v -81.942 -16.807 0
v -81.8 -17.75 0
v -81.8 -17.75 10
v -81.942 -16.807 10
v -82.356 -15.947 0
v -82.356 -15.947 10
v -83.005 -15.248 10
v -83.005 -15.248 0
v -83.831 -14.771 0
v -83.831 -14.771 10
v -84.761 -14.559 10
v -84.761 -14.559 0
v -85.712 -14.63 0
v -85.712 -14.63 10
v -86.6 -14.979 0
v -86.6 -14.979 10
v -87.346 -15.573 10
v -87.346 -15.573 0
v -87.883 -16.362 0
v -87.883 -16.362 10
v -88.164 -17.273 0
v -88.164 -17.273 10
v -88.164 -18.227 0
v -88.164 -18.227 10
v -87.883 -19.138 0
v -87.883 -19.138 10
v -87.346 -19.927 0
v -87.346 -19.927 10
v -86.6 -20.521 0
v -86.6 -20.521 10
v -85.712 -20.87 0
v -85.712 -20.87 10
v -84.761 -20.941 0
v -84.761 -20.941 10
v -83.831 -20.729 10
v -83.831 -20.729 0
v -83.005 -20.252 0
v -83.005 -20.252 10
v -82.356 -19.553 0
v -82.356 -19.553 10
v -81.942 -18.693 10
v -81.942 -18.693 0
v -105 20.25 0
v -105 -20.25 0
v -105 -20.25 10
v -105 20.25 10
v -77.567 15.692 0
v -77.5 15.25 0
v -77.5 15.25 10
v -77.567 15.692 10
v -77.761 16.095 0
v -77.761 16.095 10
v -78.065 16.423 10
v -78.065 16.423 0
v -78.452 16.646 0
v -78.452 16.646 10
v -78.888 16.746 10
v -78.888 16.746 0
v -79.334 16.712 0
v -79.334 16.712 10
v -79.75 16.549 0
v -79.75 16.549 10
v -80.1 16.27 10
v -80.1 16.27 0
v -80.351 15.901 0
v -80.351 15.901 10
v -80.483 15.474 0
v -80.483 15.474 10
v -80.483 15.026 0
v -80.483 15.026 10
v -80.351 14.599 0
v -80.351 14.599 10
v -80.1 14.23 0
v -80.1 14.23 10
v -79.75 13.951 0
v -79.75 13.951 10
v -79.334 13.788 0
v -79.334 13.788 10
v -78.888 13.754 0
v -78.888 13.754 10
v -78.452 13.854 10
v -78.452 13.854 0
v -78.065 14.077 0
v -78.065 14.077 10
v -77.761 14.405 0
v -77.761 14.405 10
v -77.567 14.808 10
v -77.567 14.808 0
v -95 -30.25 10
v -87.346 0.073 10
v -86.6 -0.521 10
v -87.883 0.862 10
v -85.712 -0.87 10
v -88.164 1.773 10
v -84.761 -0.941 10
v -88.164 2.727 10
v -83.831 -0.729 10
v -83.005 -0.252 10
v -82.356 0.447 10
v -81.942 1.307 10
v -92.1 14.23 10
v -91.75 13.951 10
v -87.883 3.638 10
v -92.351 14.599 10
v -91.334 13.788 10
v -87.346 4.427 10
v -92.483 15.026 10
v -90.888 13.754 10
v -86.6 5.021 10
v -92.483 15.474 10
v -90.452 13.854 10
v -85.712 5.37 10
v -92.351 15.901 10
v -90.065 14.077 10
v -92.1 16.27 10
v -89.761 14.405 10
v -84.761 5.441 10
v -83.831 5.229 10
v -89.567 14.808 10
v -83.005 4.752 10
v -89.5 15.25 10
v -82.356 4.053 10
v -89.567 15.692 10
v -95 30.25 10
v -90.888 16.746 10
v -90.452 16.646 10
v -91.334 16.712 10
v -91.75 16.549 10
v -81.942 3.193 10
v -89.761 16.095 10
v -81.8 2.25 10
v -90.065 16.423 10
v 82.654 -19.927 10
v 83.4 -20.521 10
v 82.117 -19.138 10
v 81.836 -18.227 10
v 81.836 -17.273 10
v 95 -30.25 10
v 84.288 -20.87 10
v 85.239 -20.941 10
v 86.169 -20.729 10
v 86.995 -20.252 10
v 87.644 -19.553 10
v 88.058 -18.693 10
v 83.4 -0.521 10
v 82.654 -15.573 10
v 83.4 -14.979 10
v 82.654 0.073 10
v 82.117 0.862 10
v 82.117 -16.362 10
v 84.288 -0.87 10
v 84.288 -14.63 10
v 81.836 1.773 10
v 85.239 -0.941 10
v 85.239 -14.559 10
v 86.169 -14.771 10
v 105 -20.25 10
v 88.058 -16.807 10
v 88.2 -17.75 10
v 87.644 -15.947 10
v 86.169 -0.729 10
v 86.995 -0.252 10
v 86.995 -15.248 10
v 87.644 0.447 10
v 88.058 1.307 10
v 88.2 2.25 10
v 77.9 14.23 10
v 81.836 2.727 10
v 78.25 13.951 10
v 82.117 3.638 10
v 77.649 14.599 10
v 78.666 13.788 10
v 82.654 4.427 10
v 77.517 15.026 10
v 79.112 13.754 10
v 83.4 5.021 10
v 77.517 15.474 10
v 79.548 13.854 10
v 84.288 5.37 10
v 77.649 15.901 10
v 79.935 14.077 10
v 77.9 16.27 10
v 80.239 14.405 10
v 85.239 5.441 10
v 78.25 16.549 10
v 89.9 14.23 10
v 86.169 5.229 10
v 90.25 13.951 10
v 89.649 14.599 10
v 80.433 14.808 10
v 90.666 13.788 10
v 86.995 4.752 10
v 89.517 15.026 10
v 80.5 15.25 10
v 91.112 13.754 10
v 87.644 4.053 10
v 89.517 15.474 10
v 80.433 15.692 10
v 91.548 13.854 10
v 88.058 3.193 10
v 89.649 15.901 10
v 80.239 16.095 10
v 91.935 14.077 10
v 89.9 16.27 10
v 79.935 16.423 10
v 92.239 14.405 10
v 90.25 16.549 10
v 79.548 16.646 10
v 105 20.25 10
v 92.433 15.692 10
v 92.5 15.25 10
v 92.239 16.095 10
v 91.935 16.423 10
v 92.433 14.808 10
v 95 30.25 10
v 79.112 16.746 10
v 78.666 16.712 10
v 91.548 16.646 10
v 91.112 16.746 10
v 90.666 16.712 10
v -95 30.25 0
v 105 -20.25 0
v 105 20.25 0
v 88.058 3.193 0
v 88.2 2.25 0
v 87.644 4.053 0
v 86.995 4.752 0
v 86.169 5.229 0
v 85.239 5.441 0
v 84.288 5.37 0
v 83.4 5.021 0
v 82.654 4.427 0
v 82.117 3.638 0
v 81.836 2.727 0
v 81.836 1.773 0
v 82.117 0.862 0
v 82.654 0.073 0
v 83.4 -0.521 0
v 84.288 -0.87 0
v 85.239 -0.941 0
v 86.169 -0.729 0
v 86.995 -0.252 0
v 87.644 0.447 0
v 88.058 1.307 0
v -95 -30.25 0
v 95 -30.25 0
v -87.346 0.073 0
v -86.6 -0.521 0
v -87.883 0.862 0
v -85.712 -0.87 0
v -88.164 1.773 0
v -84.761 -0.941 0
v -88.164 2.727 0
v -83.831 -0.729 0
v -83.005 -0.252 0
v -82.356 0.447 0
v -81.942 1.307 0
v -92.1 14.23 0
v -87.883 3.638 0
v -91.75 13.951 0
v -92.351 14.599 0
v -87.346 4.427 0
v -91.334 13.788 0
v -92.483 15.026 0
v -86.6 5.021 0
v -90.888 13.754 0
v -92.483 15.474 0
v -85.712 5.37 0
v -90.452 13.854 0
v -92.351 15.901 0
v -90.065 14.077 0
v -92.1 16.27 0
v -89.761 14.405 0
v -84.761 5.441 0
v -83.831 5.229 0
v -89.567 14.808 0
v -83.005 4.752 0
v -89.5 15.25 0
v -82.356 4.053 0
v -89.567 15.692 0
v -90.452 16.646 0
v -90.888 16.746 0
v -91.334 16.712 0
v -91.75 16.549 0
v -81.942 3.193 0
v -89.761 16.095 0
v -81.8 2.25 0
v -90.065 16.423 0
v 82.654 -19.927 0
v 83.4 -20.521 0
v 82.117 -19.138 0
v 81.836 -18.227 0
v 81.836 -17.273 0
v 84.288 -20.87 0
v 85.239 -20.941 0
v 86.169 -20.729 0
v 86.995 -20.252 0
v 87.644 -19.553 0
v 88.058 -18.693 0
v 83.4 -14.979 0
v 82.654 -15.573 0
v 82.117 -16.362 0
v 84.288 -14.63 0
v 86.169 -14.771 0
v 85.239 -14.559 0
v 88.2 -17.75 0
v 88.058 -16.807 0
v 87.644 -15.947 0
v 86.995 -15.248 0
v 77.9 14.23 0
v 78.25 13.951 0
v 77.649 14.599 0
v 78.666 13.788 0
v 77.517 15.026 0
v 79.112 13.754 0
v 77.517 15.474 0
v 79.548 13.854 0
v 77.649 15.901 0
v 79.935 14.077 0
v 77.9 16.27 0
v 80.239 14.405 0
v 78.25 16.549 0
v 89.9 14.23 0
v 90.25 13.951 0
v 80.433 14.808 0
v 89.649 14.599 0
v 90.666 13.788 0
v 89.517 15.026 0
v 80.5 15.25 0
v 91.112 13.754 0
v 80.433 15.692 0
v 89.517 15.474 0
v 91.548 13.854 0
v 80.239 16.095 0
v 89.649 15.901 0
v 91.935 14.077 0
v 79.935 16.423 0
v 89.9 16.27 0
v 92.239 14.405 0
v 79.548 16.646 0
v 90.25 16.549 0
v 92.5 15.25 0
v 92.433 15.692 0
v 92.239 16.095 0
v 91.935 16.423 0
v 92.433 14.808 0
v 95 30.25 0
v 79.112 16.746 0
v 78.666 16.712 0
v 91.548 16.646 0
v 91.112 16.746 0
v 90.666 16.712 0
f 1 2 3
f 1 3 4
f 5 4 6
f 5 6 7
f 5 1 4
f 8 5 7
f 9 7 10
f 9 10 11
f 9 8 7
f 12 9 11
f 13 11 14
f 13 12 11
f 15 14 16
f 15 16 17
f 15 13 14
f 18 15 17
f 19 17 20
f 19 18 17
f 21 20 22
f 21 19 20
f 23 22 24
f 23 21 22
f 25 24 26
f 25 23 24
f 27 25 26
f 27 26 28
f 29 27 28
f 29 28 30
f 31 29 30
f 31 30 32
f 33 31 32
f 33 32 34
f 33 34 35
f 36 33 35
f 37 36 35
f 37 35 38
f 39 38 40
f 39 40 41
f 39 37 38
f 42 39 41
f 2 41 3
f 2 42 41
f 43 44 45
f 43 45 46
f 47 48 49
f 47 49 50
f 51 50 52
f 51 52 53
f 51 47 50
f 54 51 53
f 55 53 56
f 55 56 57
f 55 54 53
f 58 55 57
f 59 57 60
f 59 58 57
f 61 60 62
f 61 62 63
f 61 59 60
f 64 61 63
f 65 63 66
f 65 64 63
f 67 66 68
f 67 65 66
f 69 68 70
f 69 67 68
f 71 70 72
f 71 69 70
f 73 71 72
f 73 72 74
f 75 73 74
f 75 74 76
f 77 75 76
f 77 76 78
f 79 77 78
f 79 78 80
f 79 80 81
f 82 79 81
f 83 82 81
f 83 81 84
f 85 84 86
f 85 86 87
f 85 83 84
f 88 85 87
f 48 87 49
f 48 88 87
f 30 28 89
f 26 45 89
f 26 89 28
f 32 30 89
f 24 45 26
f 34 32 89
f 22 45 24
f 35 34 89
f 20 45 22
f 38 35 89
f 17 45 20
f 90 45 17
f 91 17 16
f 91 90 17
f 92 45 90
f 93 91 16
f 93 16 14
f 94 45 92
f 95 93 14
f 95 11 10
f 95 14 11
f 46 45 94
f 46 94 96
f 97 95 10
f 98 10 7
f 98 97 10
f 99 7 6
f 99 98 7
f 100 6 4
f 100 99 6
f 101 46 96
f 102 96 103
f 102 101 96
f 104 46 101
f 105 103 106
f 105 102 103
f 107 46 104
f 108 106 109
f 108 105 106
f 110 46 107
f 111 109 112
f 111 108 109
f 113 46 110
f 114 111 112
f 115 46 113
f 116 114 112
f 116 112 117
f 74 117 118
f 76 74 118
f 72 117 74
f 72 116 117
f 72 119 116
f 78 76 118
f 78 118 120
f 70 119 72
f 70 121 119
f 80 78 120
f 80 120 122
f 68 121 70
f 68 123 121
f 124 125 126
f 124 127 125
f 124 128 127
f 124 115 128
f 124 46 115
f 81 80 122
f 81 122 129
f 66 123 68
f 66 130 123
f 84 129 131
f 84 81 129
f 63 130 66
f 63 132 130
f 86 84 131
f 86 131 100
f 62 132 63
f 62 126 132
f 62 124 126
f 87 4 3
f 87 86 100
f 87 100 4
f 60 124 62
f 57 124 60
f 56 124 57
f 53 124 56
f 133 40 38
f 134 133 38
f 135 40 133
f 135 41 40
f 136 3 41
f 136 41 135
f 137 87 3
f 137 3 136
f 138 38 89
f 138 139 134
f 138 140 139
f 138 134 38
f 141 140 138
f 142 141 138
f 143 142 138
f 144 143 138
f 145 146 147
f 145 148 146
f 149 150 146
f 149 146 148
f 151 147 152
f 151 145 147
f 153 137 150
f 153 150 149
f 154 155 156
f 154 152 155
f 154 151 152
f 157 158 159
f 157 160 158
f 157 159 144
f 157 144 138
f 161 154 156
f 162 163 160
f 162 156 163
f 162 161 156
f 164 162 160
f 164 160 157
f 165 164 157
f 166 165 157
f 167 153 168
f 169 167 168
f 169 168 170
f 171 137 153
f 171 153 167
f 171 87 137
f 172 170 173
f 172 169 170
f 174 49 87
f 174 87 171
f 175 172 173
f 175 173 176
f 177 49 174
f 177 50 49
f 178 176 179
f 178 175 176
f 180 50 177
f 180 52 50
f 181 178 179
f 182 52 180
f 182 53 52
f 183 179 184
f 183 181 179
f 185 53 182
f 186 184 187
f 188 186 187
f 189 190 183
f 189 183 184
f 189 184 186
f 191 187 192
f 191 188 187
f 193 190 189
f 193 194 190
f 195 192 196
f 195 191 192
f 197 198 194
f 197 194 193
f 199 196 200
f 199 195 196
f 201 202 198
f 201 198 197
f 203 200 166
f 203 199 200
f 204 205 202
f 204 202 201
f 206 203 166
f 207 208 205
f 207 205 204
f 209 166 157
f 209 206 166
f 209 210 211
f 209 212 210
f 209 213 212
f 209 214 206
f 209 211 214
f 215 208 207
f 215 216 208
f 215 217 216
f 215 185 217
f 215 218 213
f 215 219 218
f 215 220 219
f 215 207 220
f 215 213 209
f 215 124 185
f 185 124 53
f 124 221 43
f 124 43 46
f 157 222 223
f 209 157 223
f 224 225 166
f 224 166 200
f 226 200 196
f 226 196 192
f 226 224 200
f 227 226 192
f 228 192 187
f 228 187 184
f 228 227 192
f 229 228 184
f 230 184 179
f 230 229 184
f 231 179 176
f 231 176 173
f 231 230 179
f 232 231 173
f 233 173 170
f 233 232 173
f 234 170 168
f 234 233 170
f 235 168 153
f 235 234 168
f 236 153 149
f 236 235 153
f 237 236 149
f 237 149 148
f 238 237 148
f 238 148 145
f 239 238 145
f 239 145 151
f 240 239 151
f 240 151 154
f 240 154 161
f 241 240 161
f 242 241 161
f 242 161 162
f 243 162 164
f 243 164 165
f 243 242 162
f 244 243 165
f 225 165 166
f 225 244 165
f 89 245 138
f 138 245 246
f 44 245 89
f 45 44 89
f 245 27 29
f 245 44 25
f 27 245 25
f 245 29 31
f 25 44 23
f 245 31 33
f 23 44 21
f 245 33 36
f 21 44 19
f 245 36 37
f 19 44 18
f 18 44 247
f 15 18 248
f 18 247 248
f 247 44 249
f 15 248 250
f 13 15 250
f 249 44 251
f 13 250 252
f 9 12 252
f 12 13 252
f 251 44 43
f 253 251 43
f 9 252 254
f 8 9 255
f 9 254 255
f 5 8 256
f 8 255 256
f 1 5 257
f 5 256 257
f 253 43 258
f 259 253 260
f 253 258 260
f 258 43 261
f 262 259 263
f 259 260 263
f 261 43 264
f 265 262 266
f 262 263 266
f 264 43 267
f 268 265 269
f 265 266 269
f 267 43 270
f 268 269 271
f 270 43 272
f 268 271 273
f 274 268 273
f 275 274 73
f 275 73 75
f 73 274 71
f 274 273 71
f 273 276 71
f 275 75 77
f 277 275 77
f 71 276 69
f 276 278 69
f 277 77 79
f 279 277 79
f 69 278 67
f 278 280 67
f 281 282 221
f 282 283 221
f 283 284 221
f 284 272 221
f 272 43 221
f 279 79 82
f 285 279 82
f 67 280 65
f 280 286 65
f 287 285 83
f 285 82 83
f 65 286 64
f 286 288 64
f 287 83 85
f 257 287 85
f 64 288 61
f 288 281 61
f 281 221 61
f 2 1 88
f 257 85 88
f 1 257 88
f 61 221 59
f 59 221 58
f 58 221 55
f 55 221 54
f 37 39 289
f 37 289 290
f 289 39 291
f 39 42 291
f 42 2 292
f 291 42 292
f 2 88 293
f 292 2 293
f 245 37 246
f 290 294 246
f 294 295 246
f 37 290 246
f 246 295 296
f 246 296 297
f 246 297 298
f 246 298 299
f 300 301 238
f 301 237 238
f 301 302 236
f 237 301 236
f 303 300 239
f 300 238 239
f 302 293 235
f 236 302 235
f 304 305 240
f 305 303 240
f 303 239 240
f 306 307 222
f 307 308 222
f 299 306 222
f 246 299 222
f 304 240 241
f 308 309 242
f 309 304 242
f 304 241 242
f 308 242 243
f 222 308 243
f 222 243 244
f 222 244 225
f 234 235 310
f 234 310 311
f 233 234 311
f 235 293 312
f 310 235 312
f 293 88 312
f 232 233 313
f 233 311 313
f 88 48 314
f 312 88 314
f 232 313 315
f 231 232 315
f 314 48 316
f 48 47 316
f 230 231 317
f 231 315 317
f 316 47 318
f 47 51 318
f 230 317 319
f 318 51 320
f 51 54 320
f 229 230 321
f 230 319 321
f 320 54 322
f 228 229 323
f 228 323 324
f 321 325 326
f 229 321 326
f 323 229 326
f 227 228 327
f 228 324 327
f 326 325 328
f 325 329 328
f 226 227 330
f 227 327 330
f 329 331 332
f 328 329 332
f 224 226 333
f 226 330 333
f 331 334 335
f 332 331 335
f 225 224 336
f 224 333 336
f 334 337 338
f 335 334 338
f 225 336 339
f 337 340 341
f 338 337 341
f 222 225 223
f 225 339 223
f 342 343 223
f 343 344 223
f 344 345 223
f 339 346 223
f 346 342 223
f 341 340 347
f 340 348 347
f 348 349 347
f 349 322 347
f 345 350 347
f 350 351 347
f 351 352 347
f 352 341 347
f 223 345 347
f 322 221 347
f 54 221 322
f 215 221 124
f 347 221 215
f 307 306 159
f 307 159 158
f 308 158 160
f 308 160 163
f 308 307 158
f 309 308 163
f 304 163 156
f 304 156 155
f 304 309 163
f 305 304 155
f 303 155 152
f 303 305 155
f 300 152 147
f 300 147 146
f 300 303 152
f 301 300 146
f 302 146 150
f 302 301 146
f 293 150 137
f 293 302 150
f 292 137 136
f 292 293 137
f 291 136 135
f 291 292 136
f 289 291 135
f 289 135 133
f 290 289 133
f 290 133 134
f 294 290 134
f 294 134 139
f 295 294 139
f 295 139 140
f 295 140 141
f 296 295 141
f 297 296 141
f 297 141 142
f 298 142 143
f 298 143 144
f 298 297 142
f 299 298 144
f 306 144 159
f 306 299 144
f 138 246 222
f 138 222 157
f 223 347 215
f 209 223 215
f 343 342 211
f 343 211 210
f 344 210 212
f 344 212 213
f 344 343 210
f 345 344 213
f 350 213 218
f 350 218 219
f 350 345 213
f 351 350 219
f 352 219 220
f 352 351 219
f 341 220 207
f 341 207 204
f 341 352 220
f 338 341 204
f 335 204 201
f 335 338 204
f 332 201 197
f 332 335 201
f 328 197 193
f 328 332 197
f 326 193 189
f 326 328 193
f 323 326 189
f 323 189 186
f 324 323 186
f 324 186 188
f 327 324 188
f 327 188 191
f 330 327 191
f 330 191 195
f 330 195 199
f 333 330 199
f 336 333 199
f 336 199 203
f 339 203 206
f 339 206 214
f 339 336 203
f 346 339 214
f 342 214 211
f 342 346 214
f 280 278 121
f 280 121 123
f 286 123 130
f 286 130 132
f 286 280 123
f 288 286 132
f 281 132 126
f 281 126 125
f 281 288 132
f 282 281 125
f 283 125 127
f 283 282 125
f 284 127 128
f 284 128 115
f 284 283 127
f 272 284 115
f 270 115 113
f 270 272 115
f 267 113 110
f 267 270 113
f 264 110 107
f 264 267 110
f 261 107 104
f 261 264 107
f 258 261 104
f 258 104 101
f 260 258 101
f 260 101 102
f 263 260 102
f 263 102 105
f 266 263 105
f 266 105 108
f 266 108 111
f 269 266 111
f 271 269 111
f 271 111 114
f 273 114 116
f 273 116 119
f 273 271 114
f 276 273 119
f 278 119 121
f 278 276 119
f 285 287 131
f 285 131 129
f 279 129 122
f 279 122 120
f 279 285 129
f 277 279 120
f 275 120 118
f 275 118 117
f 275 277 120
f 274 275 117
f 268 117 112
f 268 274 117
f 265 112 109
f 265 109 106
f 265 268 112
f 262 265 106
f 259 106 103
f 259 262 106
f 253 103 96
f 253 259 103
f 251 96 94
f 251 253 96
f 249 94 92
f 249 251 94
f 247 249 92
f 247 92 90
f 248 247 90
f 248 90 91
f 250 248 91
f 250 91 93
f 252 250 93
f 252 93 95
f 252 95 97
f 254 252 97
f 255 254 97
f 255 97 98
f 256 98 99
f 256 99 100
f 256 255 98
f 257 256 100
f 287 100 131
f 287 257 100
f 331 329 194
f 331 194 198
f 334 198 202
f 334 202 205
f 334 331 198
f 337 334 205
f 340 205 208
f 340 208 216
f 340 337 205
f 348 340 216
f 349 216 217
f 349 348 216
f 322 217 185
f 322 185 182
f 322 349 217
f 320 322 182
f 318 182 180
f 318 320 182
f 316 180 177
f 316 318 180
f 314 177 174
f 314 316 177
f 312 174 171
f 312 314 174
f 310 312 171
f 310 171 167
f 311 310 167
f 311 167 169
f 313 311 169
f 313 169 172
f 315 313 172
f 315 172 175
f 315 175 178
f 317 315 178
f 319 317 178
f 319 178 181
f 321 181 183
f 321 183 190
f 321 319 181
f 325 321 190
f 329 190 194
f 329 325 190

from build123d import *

# Parameters (mm, degrees)
SKETCH1_W           = 210
SKETCH1_H           = 60.5
SKETCH1_R           = 3.2
SKETCH1_R_2         = 1.5
BOSS_EXTRUDE1_DEPTH = 10
CHAMFER1_SIZE       = 10
CHAMFER2_SIZE       = 10


with BuildPart() as part:
    # Sketch1 → Boss-Extrude1 (new body)
    with BuildSketch(Plane.XY):
        Rectangle(SKETCH1_W, SKETCH1_H)
        with Locations((-85, 2.25)):
            Circle(SKETCH1_R, mode=Mode.SUBTRACT)
        with Locations((-85, -17.75)):
            Circle(SKETCH1_R, mode=Mode.SUBTRACT)
        with Locations((85, -17.75)):
            Circle(SKETCH1_R, mode=Mode.SUBTRACT)
        with Locations((85, 2.25)):
            Circle(SKETCH1_R, mode=Mode.SUBTRACT)
        with Locations((-91, 15.25)):
            Circle(SKETCH1_R_2, mode=Mode.SUBTRACT)
        with Locations((-79, 15.25)):
            Circle(SKETCH1_R_2, mode=Mode.SUBTRACT)
        with Locations((79, 15.25)):
            Circle(SKETCH1_R_2, mode=Mode.SUBTRACT)
        with Locations((91, 15.25)):
            Circle(SKETCH1_R_2, mode=Mode.SUBTRACT)
    extrude(amount=BOSS_EXTRUDE1_DEPTH)

    # Chamfer1
    chamfer1_edges = [part.edges().sort_by_distance(p)[0] for p in [
        (-105, 30.25, 5),
        (105, 30.25, 5),
    ]]
    chamfer(chamfer1_edges, length=CHAMFER1_SIZE)

    # Chamfer2
    chamfer2_edges = [part.edges().sort_by_distance(p)[0] for p in [
        (105, -30.25, 5),
        (-105, -30.25, 5),
    ]]
    chamfer(chamfer2_edges, length=CHAMFER2_SIZE)


solid = part.part
